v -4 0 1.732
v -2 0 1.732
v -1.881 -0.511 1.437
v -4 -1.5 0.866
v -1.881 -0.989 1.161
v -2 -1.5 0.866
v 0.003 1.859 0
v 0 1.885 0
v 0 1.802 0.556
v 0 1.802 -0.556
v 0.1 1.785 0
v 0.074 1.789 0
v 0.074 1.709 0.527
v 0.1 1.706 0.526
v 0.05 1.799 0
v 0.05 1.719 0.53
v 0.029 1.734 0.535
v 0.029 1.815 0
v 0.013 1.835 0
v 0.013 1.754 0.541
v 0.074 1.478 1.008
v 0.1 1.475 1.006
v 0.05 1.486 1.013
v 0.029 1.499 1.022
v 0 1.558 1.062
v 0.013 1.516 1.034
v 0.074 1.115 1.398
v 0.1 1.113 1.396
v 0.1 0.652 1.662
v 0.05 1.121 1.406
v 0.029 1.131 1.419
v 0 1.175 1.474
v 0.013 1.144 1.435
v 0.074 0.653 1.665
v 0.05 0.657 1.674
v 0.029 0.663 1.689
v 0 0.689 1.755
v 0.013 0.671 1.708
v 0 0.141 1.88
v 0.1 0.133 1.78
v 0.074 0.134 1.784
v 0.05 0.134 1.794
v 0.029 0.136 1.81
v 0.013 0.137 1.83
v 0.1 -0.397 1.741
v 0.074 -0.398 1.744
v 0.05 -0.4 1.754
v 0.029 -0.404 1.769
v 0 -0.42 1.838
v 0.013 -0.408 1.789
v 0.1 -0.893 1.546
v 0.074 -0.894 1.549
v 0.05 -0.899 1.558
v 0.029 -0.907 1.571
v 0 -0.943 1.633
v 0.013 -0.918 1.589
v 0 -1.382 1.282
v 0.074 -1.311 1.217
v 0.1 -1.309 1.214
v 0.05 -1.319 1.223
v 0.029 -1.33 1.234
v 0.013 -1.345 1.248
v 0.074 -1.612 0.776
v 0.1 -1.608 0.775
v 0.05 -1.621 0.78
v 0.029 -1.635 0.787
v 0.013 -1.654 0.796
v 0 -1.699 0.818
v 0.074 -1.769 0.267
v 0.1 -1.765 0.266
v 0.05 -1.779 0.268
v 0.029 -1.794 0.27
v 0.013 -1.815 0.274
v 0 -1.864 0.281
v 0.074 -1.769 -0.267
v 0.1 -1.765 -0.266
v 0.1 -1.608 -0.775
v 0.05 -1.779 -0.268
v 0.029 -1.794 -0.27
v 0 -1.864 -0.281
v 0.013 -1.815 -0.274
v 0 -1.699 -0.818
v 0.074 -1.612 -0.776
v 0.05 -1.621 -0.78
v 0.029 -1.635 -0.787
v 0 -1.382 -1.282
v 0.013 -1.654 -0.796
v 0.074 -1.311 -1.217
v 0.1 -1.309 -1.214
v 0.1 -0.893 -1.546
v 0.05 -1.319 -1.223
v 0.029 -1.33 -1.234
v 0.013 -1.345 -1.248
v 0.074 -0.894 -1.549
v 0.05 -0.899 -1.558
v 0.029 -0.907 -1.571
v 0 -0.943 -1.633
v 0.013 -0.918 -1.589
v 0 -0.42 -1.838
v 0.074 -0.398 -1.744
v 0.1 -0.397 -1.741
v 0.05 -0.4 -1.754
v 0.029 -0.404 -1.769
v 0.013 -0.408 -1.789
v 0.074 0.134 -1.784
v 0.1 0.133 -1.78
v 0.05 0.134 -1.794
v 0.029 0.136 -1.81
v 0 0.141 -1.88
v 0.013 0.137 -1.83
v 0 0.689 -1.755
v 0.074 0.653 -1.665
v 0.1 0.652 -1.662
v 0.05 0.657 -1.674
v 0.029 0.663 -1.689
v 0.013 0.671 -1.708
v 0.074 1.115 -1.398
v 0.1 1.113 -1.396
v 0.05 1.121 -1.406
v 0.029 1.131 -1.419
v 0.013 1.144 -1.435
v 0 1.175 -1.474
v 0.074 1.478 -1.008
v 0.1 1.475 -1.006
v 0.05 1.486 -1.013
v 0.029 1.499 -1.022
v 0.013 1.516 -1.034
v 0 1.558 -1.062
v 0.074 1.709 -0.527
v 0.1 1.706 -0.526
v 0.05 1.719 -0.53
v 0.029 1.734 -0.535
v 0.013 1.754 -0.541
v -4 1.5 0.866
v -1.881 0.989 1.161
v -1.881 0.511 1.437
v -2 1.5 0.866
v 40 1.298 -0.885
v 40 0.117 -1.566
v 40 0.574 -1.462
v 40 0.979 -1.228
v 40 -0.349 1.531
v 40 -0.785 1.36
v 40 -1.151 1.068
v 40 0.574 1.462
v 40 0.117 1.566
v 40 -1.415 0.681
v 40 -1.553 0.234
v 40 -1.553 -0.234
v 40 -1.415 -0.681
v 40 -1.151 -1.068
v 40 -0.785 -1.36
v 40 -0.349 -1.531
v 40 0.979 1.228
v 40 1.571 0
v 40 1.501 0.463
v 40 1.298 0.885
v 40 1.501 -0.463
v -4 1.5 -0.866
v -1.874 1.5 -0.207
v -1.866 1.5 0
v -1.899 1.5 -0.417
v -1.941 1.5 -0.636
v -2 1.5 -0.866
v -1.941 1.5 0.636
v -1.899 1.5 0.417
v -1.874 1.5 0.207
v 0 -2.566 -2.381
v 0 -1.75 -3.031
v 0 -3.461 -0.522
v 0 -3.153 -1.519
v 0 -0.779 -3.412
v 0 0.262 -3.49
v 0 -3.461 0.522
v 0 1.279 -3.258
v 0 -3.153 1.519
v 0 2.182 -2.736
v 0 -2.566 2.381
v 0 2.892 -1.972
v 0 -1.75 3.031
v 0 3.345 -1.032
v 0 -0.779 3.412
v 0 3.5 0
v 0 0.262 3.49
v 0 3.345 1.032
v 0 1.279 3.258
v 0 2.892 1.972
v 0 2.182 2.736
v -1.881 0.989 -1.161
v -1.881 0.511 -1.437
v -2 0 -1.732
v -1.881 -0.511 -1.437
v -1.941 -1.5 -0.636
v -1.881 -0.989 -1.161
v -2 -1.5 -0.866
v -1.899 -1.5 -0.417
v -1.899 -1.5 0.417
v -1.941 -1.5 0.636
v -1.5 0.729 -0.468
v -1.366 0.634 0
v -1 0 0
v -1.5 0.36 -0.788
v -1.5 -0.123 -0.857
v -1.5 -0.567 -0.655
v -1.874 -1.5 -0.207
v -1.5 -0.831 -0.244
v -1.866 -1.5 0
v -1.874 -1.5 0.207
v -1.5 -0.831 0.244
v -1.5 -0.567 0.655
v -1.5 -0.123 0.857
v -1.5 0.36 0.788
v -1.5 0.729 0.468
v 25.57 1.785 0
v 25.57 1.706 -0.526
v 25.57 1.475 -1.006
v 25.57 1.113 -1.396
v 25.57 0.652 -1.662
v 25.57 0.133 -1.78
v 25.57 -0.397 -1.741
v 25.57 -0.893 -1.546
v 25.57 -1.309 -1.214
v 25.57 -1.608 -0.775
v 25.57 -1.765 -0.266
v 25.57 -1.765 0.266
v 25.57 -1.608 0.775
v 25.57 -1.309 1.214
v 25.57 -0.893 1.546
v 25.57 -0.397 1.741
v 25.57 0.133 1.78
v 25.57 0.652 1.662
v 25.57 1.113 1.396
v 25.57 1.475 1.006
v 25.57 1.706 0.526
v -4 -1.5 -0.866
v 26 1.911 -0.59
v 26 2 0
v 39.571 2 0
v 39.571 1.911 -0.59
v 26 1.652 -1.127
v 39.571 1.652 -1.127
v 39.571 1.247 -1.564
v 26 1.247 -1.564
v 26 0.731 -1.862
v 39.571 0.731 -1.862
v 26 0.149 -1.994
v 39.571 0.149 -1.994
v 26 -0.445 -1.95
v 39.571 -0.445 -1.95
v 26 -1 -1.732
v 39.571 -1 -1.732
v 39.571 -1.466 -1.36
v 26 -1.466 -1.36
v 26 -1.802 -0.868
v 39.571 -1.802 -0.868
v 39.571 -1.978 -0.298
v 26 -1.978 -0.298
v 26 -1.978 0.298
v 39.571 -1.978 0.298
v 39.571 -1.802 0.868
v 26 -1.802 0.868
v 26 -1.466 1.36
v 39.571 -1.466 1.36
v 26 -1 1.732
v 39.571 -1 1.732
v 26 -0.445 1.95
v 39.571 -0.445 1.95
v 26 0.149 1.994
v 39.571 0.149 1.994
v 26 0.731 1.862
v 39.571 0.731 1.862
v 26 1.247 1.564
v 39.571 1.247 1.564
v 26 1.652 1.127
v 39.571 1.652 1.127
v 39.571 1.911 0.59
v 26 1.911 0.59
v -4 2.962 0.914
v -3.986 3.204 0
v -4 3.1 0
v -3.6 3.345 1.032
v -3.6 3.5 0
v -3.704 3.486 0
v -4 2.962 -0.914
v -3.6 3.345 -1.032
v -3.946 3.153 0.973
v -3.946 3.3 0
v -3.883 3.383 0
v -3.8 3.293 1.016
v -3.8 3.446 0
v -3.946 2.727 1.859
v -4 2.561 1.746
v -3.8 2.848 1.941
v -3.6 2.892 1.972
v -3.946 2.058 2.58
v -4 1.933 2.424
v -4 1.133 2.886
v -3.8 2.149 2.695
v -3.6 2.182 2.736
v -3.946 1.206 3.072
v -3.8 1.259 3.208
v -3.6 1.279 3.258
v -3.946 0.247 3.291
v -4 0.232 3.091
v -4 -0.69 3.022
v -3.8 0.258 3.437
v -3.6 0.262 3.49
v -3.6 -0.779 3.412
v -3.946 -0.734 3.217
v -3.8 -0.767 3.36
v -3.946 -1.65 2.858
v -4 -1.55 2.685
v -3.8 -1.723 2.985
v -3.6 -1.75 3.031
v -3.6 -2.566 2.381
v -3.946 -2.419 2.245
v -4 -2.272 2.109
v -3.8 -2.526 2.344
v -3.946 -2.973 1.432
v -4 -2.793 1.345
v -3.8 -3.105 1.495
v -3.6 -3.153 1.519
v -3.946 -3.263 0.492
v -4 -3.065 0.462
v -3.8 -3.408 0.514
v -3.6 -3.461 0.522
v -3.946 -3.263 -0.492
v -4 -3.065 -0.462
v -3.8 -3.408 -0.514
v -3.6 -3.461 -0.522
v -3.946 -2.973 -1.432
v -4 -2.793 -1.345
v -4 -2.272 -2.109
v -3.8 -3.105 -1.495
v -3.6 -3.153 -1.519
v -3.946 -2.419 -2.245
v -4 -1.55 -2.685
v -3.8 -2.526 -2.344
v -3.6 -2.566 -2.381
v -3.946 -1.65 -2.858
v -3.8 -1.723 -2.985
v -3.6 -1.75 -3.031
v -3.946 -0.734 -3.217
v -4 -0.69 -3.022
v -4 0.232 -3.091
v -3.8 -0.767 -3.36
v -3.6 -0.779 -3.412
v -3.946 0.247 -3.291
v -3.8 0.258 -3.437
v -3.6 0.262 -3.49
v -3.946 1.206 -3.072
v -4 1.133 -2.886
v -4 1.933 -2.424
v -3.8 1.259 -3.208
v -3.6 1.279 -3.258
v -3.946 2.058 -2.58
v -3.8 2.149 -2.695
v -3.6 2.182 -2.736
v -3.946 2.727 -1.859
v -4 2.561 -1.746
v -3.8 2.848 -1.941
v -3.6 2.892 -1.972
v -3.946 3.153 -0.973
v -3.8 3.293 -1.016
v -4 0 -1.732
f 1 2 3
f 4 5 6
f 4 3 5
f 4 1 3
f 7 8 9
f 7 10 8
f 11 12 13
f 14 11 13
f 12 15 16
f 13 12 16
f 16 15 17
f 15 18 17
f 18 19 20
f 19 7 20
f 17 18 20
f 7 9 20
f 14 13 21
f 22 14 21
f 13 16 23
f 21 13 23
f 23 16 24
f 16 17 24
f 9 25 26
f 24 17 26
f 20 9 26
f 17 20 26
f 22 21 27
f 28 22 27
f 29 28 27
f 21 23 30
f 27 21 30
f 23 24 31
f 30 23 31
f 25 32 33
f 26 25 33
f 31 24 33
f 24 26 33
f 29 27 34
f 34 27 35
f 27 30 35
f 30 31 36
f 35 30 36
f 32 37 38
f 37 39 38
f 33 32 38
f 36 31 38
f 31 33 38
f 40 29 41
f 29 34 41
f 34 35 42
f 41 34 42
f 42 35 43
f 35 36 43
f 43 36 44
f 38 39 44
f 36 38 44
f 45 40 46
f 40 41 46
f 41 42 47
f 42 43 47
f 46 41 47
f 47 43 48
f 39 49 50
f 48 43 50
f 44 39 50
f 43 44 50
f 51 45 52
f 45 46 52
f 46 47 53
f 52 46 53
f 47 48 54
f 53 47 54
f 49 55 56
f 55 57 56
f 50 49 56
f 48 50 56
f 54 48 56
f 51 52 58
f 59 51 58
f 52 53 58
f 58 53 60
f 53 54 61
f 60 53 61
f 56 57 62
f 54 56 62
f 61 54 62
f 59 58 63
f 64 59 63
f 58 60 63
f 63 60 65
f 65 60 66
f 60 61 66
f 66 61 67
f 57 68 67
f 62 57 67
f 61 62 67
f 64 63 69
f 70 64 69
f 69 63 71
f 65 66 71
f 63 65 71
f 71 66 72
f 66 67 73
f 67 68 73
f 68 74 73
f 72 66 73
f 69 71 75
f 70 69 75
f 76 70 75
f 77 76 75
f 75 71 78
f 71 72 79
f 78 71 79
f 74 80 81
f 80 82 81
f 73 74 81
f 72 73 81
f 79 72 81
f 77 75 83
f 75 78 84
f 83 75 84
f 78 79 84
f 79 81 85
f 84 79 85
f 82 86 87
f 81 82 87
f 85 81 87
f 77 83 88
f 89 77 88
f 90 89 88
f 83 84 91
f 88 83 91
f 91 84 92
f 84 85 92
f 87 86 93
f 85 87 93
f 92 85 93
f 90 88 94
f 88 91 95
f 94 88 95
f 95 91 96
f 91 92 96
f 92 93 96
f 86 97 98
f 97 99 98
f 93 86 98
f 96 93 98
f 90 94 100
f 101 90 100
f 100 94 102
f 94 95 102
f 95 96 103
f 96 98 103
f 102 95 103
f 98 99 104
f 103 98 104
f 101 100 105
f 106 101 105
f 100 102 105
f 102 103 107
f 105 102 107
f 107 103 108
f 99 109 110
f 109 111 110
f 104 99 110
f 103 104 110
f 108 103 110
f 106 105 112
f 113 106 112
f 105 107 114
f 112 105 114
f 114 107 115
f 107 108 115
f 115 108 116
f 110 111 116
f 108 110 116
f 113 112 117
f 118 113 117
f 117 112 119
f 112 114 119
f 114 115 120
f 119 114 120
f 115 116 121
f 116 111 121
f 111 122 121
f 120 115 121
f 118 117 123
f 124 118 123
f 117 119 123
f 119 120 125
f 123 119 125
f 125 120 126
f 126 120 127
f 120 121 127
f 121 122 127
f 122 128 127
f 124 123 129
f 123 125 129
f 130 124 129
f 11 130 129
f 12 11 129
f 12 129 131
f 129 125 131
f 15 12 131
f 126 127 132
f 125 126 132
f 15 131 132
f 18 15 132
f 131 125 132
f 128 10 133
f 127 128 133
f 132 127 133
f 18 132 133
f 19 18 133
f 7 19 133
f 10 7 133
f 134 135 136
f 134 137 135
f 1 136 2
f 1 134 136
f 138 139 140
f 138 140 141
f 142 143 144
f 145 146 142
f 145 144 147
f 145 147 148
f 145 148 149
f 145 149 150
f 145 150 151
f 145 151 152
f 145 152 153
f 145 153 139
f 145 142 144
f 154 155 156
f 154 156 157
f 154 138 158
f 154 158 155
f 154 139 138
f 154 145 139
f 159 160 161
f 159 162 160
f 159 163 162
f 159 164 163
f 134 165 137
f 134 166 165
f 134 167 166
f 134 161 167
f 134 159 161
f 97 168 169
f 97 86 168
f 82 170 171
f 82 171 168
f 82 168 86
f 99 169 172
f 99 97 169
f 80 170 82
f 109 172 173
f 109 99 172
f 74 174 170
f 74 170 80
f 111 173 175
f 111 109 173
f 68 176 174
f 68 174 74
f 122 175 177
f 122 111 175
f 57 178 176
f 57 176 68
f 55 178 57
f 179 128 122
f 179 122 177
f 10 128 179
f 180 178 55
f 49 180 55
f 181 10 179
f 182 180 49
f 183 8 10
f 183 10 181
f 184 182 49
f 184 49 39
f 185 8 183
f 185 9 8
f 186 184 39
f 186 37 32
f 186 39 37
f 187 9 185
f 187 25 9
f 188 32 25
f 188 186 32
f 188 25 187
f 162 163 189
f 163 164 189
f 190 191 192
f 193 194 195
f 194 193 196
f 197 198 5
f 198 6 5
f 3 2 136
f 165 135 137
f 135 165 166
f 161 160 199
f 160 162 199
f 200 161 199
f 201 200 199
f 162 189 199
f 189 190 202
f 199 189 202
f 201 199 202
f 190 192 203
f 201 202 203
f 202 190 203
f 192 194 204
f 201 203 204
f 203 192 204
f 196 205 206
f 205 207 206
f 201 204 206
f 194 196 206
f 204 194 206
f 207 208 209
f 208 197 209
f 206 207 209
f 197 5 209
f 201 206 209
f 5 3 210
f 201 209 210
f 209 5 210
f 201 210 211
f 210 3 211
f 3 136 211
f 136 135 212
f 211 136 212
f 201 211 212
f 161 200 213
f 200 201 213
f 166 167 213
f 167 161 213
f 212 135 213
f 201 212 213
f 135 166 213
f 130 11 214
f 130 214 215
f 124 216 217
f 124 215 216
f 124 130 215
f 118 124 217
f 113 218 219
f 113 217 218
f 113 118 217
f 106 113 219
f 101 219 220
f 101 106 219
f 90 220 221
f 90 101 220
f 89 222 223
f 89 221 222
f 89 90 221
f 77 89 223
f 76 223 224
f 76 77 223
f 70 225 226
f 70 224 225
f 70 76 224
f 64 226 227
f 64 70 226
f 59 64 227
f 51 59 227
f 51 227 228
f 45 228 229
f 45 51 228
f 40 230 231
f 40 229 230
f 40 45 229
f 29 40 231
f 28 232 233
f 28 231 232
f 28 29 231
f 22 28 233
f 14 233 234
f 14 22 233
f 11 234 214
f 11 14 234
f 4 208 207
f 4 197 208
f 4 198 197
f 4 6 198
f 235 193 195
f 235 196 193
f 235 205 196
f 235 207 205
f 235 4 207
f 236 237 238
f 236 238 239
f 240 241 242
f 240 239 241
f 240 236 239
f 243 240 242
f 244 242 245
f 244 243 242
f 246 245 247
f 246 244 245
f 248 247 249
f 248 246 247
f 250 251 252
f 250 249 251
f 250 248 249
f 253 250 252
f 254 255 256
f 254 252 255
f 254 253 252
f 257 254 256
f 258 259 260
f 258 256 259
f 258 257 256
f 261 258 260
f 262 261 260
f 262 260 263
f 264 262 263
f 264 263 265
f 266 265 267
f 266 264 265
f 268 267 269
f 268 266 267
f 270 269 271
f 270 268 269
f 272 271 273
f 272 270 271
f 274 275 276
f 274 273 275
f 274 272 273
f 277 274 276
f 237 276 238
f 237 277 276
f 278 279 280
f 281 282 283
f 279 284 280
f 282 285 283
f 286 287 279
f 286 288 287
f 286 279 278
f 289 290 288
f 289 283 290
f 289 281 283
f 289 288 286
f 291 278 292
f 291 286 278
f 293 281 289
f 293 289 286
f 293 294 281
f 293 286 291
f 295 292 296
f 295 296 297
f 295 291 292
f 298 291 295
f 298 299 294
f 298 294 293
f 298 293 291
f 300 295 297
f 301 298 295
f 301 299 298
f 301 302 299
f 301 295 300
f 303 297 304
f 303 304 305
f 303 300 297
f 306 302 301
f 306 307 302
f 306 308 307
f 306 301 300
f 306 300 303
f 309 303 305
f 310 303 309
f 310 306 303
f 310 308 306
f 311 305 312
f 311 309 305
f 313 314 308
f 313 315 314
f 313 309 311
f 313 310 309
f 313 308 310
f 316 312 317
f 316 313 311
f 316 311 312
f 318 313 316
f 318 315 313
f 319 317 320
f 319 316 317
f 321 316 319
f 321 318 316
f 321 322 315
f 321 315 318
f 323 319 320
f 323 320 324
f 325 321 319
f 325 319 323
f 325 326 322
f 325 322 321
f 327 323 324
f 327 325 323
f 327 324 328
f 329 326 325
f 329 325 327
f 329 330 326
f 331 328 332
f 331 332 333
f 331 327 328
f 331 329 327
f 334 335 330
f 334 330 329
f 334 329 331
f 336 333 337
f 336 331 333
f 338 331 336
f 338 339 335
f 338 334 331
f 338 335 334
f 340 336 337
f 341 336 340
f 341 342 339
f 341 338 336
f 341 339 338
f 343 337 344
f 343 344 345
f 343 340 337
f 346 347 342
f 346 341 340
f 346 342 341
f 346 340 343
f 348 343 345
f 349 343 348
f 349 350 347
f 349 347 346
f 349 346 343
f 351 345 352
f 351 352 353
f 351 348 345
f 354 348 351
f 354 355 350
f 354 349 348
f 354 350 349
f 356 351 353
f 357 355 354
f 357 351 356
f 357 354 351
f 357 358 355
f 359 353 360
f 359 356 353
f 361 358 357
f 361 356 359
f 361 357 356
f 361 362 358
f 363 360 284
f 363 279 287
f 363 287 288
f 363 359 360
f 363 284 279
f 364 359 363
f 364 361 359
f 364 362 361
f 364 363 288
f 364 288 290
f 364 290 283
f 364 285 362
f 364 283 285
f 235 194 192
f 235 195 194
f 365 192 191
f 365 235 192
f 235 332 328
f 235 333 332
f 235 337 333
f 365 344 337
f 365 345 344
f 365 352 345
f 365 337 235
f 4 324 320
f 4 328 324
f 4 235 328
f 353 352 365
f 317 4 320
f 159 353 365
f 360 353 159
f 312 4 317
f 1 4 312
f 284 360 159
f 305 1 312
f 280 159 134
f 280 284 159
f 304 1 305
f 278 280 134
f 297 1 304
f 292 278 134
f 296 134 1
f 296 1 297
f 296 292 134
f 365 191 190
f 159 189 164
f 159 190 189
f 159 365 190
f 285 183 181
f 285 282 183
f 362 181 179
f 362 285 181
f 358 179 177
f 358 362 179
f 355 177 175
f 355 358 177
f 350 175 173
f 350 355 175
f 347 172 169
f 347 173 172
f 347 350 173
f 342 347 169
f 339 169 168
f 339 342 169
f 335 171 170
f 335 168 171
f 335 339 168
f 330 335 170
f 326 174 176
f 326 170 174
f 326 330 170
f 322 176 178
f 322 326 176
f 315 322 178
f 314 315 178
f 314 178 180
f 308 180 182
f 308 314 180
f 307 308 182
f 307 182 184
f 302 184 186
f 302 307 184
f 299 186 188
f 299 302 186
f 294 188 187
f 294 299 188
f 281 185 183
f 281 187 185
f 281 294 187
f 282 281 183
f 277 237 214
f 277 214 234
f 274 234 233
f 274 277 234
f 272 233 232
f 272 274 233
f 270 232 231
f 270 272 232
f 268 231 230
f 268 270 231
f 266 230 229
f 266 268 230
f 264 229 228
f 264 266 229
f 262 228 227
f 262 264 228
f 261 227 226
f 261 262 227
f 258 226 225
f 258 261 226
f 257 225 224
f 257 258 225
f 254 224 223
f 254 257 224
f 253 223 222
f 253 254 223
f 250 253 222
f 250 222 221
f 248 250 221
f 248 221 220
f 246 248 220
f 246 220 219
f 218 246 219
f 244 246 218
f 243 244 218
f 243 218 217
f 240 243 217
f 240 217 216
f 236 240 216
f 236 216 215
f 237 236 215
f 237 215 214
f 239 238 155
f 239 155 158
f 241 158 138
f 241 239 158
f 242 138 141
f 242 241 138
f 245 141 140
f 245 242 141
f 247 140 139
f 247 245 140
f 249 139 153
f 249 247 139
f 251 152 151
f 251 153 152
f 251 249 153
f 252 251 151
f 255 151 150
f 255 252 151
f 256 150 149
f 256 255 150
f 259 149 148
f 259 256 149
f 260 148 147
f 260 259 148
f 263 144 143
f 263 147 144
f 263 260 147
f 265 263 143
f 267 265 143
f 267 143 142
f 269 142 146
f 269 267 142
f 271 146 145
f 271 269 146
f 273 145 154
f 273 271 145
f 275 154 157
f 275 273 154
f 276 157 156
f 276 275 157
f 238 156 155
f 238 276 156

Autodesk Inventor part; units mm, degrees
ref_plane "YZ Plane" through (0, 0, 0) normal (1, 0, 0) x (0, 1, 0)
ref_plane "XZ Plane" through (0, 0, 0) normal (0, 1, 0) x (-1, 0, 0)
sketch "Эскиз1" plane through (0, 0, 0) normal (0, 0, 1) x (1, 0, 0)
  line L0 (-1, 0) -> (40, 0)
  line L1 (40, 0) -> (40, 2)
  line L2 (40, 2) -> (26, 2)
  line L3 (26, 2) -> (25.5705, 1.7853)
  line L4 (25.5705, 1.7853) -> (0, 1.7853)
  line L5 (0, 1.7853) -> (0, 3.5)
  line L6 (0, 3.5) -> (-4, 3.5)
  line L7 (-4, 3.5) -> (-4, 1.7321)
  line L8 (-4, 1.7321) -> (-2, 1.7321)
  line L9 (-2, 1.7321) -> (-1, 0)
  line L10 (-12.8, 0) -> (48.8, 0) projected
  line L11 (0, -0.7) -> (0, 4.2) projected
  line L12 (26, 2) -> (0, 2) construction
  dimension "d1" = 14
  dimension "d2" = 0.4295
  dimension "d3" = 4
  dimension "d4" = 2
  dimension "d5" = 60
  dimension "d6" = 4
  dimension "d7" = 3.5705
  dimension "d8" = 3.4641
  dimension "d9" = 7
  dimension "d26" = 40
revolve "Базовый элемент" add sketch "Эскиз1" angle 360 about axis through (-1, 0, 0) along (1, 0, 0)
sketch "Эскиз2" plane through (-4, 0, 0) normal (-1, 0, 0) x (0, 0, 1)
  circle A0 centre (0, 0) radius 1.7321 projected
  line L0 (0, -4.9) -> (0, 4.9) projected
  line L1 (-4.9, 0) -> (4.9, 0) projected
  line L2 (1.7321, 0) -> (0.866, -1.5)
  line L3 (0.866, -1.5) -> (-0.866, -1.5)
  line L4 (-0.866, -1.5) -> (-1.7321, 0)
  line L5 (-1.7321, 0) -> (-0.866, 1.5)
  line L6 (-0.866, 1.5) -> (0.866, 1.5)
  line L7 (0.866, 1.5) -> (1.7321, 0)
extrude "Паз" add sketch "Эскиз2" against normal up to next contours L7 A0 | A0 L2 | L6 L0 A0 | A0 L0 L3 | L0 L6 A0 | A0 L3 L0 | L4 A0 | A0 L5
fillet "Сопряжение1" radius 0.4 1 edges at (-4, -3.5, 0)
thread "Резьба" size "M4x0.7" class "6g" standard "ISO Metric profile" length 14
chamfer "Фаска1" distance 0.4294 distance2 0.4294 1 edges at (40, -2, 0) measured on face at (40, -0.1312, -0.9006)
ref_plane "Work Plane1" through (29, 0, 0) normal (0, -1, 0) x (1, 0, 0)
fillet "Fillet2" radius 0.1 1 edges at (0, -1.7853, 0)
equation "\"d1\" = GEL"
equation "\"d3\" = KOH"
equation "\"d4\" = INTI"
equation "\"d6\" = GD"
equation "\"d7\" = BDM"
equation "\"d8\" = 1.1547 * SW"
equation "\"d9\" = KOD"
equation "\"d26\" = NLG"
equation "\"d30\" = R"
equation "\"d17\" = RR"
equation "\"d13\" = GEL"
equation "\"d15\" = -0.5 * SPD + 0.5 * GD"
equation "\"d16\" = GUL"
equation "\"GD\" = NND"
equation "\"NLG\" = 40"
equation "\"GEL\" = 14"
equation "\"KOD\" = 7"
equation "\"KOH\" = NND"
equation "\"INTI\" = 2"
equation "\"GAL\" = 0.61345 * PTC"
equation "\"GUL\" = 0.61345 * PTC"
equation "\"BDM\" = 3.5705"
equation "\"SW\" = 3"
equation "\"RR\" = 0.4"
equation "\"SPD\" = NND - 1.2269 * PTC"
equation "\"R\" = 0.1"
equation "\"PHH\" = 0.4"
equation "\"GD1\" = THREADDIA - 1.2269 * PTC"
equation "\"THREADDIA\" = 4"
equation "\"FAWI\" = 45deg"
equation "\"PTC\" = 0.7"
equation "\"NND\" = 4"
equation "\"TOA\" = 30deg"
equation "\"E0\" = 1.155 * SW"
properties part number "CSN 02 1143 - M4 x 40" material "Сталь, мягкая"
